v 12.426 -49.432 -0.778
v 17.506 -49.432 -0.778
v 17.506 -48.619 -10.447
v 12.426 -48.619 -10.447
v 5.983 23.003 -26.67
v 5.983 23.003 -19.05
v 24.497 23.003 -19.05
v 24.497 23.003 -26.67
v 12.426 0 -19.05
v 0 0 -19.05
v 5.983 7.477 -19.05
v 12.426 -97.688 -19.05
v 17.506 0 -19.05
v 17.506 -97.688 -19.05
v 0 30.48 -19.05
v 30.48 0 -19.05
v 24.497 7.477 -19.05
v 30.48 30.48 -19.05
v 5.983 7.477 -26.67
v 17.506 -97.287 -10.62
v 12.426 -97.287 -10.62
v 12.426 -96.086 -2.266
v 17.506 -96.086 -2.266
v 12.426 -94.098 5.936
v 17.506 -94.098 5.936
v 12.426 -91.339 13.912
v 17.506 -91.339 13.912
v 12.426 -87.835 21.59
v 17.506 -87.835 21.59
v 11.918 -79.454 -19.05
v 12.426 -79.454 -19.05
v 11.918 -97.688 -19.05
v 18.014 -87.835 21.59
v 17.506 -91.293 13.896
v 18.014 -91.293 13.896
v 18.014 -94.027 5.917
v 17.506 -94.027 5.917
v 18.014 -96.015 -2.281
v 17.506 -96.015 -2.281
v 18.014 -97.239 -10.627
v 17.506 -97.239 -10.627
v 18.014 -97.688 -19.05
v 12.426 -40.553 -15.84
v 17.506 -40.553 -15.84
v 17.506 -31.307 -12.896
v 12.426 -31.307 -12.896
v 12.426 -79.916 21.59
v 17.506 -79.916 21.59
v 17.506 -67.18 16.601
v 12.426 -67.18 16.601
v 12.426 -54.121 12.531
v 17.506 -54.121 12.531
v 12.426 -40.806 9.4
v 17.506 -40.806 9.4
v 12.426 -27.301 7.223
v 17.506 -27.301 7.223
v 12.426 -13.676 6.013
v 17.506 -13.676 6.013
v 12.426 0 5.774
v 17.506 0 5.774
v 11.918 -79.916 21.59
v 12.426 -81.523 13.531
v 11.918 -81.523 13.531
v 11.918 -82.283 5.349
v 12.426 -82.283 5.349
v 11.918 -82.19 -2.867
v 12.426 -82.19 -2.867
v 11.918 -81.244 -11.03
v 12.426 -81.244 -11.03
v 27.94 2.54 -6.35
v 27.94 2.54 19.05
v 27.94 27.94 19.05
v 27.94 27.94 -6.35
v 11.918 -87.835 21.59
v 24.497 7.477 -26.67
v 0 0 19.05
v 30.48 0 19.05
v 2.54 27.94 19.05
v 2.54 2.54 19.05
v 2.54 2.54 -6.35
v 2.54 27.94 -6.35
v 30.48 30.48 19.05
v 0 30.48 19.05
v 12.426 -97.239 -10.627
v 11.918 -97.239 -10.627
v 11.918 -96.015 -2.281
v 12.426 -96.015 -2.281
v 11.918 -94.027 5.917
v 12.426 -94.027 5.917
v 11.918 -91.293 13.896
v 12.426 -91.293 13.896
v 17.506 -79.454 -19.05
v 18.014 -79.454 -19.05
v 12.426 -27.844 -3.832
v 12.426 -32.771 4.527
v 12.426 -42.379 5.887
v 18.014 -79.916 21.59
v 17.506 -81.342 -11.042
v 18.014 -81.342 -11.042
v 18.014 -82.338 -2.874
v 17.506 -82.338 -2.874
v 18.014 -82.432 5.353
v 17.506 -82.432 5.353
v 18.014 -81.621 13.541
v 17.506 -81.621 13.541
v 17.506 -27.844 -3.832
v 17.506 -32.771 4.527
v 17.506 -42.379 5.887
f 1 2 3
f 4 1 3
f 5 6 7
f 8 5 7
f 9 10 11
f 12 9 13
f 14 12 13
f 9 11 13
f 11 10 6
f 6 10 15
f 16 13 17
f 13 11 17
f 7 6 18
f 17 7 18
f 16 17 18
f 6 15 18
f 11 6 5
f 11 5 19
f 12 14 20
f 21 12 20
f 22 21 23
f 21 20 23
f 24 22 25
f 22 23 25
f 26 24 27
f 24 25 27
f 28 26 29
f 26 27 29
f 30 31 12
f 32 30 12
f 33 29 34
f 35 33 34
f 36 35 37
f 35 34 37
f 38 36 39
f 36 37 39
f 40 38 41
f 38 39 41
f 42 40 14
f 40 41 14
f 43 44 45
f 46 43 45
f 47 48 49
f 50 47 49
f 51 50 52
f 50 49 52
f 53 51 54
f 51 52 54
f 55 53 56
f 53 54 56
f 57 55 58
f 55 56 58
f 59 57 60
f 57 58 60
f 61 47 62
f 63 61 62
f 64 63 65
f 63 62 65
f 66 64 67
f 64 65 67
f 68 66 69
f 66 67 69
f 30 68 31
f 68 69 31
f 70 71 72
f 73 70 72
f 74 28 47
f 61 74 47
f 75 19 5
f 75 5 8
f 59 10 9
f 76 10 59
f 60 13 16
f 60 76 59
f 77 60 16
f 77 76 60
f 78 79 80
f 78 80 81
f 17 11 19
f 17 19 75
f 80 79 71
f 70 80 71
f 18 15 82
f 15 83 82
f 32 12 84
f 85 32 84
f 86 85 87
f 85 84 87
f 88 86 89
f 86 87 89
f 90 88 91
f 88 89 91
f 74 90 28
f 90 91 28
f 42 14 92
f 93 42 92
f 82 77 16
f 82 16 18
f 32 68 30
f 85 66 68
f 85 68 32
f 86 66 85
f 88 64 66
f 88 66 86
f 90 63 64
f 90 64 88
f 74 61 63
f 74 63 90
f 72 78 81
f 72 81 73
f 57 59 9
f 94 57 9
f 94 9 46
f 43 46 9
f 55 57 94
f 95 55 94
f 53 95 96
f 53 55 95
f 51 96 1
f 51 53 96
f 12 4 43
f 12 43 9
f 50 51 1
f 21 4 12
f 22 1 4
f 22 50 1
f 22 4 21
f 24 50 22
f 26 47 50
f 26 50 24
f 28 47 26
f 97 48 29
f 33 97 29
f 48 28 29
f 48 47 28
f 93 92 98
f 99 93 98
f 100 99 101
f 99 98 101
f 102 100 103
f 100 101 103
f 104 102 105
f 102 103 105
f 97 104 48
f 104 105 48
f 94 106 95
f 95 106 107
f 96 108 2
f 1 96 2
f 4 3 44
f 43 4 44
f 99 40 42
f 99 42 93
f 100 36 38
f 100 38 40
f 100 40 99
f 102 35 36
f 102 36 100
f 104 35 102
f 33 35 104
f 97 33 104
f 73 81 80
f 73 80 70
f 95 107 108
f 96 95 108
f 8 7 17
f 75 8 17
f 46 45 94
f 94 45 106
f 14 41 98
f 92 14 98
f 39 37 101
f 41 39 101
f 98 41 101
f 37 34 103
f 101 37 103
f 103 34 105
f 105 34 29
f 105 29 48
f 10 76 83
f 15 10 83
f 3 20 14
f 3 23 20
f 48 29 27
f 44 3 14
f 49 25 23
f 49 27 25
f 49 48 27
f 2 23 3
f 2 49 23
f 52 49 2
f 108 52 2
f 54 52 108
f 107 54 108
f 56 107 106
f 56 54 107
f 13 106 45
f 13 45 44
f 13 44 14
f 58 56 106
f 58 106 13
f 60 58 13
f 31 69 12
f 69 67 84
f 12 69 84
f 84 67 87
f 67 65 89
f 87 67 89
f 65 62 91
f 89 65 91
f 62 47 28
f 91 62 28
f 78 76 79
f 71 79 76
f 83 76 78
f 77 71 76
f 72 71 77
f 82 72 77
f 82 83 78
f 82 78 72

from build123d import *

# Parameters (mm, degrees)
F0_W      = 30.48
F0_H      = 30.48
F1_DEPTH  = 19.05
F2_W      = 18.5134310317
F2_H      = 15.5255280393
F3_DEPTH  = 7.62
F5_DEPTH  = 21.59
F6_W      = 97.6882427931
F6_H      = 2.54
F7_DEPTH  = 25.4
F9_DEPTH  = 25.4
F11_DEPTH = 0.508
F13_DEPTH = 0.508
F15_DEPTH = 25.4
F16_W     = 25.4
F16_H     = 25.4
F17_DEPTH = 25.4


with BuildPart() as f1:
    # F0 (on Top) → F1 (new body, symmetric)
    with BuildSketch(Plane.XY):
        with Locations((15.24, 15.24)):
            Rectangle(F0_W, F0_H)
    extrude(amount=F1_DEPTH, both=True)

    # F2 (on face) → F3 (join)
    with BuildSketch(Plane(origin=(0, 0, -19.05), x_dir=(1, 0, 0), z_dir=(0, 0, -1))):
        with Locations((15.24, -15.24)):
            Rectangle(F2_W, F2_H)
    extrude(amount=F3_DEPTH)

    # F4 (on Top) → F5 (join, symmetric)
    with BuildSketch(Plane.XY):
        Polygon((17.506013127, 0), (12.426013127, 0), (12.426013127, -97.6882427931), (14.966013127, -97.6882427931), (17.506013127, -97.6882427931), align=None)
    extrude(amount=F5_DEPTH, both=True)

    # F6 (on face) → F7 (cut)
    with BuildSketch(Plane.YZ.offset(17.506013127)):
        with BuildLine():
            ThreePointArc((-79.9160450697, 21.59), (-40.8055075971, 9.3997324049), (0, 5.7738097385))
            Line((0, 5.7738097385), (0, 9.3484056997))
            Line((0, 9.3484056997), (0, 19.05))
            Line((0, 19.05), (0, 21.59))
            Line((0, 21.59), (-67.3900023103, 21.59))
            Line((-67.3900023103, 21.59), (-79.9160450697, 21.59))
        make_face()
        with Locations((-48.8441213965, -20.32)):
            Rectangle(F6_W, F6_H)
    extrude(amount=-F7_DEPTH, mode=Mode.SUBTRACT)

    # F8 (on face) → F9 (cut)
    with BuildSketch(Plane.YZ.offset(17.506013127)):
        with BuildLine():
            ThreePointArc((-97.6882427931, -19.05), (-95.1897163869, 1.8587252761), (-87.8348387778, 21.59))
            Line((-87.8348387778, 21.59), (-97.6882427931, 21.59))
            Line((-97.6882427931, 21.59), (-97.6882427931, -19.05))
        make_face()
    extrude(amount=-F9_DEPTH, mode=Mode.SUBTRACT)

    # F14 (on face) → F15 (cut)
    with BuildSketch(Plane.YZ.offset(18.014013127)):
        Polygon((-31.3068207463, -12.8963272836), (-27.8436254601, -3.8319919441), (-32.7711412533, 4.5271638053), (-42.3788482306, 5.8865251898), (-49.4319470766, -0.7775346392), (-48.6193105033, -10.4468427083), (-40.5528704251, -15.8402128236), align=None)
    extrude(amount=-F15_DEPTH, mode=Mode.SUBTRACT)

    # F16 (on face) → F17 (cut)
    with BuildSketch(Plane.XY.offset(19.05)):
        with Locations((15.24, 15.24)):
            Rectangle(F16_W, F16_H)
    extrude(amount=-F17_DEPTH, mode=Mode.SUBTRACT)


with BuildPart() as f11:
    # F10 (on face) → F11 (new body)
    with BuildSketch(Plane.YZ.offset(17.506013127)):
        with BuildLine():
            ThreePointArc((-79.454369843, -19.05), (-82.4983241821, 1.2380426599), (-79.9160450697, 21.59))
            Line((-79.9160450697, 21.59), (-87.8348387778, 21.59))
            ThreePointArc((-87.8348387778, 21.59), (-95.1158094508, 1.8408061102), (-97.6882427931, -19.05))
            Line((-97.6882427931, -19.05), (-79.454369843, -19.05))
        make_face()
    extrude(amount=F11_DEPTH)


with BuildPart() as f13:
    # F12 (on face) → F13 (new body)
    with BuildSketch(Plane(origin=(12.426013127, 0, 0), x_dir=(0, -1, 0), z_dir=(-1, 0, 0))):
        with BuildLine():
            Line((87.8348387778, 21.59), (79.9160450697, 21.59))
            ThreePointArc((79.9160450697, 21.59), (82.4983241821, 1.2380426599), (79.454369843, -19.05))
            Line((79.454369843, -19.05), (97.6882427931, -19.05))
            ThreePointArc((97.6882427931, -19.05), (95.1146199968, 1.8405177202), (87.8348387778, 21.59))
        make_face()
        with BuildLine():
            ThreePointArc((79.454369843, -19.05), (82.4983241821, 1.2380426599), (79.9160450697, 21.59))
            ThreePointArc((79.9160450697, 21.59), (82.3436895998, 1.2397993271), (79.454369843, -19.05))
        make_face()
        with BuildLine():
            ThreePointArc((97.6882427931, -19.05), (95.1158094508, 1.8408061102), (87.8348387778, 21.59))
            ThreePointArc((87.8348387778, 21.59), (95.1146199968, 1.8405177202), (97.6882427931, -19.05))
        make_face()
    extrude(amount=F13_DEPTH)


solid = Compound([f1.part, f11.part, f13.part])
